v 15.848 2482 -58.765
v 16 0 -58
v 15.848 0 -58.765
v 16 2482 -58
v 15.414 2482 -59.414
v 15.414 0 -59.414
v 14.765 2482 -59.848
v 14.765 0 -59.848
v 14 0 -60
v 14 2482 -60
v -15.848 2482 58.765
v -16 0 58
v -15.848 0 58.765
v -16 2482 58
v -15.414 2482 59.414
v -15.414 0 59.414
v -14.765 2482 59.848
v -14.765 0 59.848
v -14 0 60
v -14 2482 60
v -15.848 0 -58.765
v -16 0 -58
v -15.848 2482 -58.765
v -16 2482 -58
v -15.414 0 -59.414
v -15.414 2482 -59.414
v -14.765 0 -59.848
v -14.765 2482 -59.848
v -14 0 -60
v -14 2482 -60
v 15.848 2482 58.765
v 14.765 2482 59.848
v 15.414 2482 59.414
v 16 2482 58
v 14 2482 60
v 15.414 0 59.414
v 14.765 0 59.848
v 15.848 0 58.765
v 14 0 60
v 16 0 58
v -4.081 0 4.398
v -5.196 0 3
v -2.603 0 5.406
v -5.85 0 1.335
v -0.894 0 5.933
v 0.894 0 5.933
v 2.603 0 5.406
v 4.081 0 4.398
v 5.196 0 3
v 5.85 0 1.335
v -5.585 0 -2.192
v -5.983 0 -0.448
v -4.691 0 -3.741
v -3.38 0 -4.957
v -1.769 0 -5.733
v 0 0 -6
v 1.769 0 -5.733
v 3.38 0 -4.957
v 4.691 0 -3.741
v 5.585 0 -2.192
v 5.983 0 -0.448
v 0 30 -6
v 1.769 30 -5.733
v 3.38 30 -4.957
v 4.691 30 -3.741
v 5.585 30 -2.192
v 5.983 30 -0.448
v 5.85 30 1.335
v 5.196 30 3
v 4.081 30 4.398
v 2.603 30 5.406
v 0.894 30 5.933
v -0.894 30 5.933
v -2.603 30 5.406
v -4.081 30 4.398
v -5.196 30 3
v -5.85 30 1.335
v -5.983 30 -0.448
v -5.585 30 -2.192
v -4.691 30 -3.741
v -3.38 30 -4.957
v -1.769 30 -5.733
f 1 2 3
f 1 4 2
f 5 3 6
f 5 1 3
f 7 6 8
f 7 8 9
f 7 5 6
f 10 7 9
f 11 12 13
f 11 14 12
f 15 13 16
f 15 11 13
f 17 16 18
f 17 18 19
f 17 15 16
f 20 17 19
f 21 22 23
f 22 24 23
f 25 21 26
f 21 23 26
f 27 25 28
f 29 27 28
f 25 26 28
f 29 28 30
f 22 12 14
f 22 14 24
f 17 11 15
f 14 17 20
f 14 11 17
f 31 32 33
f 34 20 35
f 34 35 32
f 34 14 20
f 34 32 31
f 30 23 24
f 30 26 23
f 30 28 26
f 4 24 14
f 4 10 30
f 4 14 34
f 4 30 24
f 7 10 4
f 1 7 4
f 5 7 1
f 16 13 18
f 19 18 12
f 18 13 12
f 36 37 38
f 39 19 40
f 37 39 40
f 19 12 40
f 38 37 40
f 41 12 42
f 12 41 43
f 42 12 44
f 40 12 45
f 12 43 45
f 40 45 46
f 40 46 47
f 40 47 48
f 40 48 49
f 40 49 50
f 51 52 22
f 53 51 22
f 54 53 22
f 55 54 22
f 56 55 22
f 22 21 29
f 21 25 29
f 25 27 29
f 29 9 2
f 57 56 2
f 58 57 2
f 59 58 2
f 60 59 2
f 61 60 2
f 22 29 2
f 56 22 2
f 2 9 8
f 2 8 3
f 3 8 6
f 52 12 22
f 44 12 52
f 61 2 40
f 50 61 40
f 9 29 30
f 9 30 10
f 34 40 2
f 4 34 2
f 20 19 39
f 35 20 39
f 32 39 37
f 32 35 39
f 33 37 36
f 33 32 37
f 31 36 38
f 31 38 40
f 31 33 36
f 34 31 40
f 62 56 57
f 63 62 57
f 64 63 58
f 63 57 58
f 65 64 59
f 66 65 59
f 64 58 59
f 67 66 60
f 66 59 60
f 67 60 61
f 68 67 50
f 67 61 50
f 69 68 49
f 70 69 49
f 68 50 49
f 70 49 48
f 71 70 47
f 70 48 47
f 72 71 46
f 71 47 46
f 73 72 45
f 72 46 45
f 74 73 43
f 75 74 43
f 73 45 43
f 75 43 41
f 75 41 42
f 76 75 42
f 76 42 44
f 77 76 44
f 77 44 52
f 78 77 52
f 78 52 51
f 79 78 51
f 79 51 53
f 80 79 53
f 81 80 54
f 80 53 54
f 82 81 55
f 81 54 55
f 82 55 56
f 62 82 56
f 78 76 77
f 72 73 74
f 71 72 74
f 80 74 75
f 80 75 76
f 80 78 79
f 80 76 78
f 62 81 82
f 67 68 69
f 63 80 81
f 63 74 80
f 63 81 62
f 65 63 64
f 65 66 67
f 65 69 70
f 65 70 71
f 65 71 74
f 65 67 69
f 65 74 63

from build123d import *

# Parameters (mm, degrees)
SKETCH1_W           = 32
SKETCH1_H           = 120
BOSS_EXTRUDE1_DEPTH = 2482
FILLET1_R           = 2
SKETCH2_R           = 6
CUT_EXTRUDE1_DEPTH  = 30


with BuildPart() as part:
    # Sketch1 → Boss-Extrude1 (new body)
    with BuildSketch(Plane(origin=(0, 0, 0), x_dir=(1, 0, 0), z_dir=(0, 1, 0))):
        Rectangle(SKETCH1_W, SKETCH1_H)
    extrude(amount=BOSS_EXTRUDE1_DEPTH)

    # Fillet1
    fillet1_edges = [part.edges().sort_by_distance(p)[0] for p in [
        (16, 1241, 60),
        (-16, 1241, 60),
        (-16, 1241, -60),
        (16, 1241, -60),
    ]]
    fillet(fillet1_edges, radius=FILLET1_R)

    # Sketch2 → Cut-Extrude1 (cut)
    with BuildSketch(Plane.XZ):
        with Locations(Location((0, 0, 0), (0, 0, 270))):
            Circle(SKETCH2_R)
    extrude(amount=-CUT_EXTRUDE1_DEPTH, mode=Mode.SUBTRACT)


solid = part.part
